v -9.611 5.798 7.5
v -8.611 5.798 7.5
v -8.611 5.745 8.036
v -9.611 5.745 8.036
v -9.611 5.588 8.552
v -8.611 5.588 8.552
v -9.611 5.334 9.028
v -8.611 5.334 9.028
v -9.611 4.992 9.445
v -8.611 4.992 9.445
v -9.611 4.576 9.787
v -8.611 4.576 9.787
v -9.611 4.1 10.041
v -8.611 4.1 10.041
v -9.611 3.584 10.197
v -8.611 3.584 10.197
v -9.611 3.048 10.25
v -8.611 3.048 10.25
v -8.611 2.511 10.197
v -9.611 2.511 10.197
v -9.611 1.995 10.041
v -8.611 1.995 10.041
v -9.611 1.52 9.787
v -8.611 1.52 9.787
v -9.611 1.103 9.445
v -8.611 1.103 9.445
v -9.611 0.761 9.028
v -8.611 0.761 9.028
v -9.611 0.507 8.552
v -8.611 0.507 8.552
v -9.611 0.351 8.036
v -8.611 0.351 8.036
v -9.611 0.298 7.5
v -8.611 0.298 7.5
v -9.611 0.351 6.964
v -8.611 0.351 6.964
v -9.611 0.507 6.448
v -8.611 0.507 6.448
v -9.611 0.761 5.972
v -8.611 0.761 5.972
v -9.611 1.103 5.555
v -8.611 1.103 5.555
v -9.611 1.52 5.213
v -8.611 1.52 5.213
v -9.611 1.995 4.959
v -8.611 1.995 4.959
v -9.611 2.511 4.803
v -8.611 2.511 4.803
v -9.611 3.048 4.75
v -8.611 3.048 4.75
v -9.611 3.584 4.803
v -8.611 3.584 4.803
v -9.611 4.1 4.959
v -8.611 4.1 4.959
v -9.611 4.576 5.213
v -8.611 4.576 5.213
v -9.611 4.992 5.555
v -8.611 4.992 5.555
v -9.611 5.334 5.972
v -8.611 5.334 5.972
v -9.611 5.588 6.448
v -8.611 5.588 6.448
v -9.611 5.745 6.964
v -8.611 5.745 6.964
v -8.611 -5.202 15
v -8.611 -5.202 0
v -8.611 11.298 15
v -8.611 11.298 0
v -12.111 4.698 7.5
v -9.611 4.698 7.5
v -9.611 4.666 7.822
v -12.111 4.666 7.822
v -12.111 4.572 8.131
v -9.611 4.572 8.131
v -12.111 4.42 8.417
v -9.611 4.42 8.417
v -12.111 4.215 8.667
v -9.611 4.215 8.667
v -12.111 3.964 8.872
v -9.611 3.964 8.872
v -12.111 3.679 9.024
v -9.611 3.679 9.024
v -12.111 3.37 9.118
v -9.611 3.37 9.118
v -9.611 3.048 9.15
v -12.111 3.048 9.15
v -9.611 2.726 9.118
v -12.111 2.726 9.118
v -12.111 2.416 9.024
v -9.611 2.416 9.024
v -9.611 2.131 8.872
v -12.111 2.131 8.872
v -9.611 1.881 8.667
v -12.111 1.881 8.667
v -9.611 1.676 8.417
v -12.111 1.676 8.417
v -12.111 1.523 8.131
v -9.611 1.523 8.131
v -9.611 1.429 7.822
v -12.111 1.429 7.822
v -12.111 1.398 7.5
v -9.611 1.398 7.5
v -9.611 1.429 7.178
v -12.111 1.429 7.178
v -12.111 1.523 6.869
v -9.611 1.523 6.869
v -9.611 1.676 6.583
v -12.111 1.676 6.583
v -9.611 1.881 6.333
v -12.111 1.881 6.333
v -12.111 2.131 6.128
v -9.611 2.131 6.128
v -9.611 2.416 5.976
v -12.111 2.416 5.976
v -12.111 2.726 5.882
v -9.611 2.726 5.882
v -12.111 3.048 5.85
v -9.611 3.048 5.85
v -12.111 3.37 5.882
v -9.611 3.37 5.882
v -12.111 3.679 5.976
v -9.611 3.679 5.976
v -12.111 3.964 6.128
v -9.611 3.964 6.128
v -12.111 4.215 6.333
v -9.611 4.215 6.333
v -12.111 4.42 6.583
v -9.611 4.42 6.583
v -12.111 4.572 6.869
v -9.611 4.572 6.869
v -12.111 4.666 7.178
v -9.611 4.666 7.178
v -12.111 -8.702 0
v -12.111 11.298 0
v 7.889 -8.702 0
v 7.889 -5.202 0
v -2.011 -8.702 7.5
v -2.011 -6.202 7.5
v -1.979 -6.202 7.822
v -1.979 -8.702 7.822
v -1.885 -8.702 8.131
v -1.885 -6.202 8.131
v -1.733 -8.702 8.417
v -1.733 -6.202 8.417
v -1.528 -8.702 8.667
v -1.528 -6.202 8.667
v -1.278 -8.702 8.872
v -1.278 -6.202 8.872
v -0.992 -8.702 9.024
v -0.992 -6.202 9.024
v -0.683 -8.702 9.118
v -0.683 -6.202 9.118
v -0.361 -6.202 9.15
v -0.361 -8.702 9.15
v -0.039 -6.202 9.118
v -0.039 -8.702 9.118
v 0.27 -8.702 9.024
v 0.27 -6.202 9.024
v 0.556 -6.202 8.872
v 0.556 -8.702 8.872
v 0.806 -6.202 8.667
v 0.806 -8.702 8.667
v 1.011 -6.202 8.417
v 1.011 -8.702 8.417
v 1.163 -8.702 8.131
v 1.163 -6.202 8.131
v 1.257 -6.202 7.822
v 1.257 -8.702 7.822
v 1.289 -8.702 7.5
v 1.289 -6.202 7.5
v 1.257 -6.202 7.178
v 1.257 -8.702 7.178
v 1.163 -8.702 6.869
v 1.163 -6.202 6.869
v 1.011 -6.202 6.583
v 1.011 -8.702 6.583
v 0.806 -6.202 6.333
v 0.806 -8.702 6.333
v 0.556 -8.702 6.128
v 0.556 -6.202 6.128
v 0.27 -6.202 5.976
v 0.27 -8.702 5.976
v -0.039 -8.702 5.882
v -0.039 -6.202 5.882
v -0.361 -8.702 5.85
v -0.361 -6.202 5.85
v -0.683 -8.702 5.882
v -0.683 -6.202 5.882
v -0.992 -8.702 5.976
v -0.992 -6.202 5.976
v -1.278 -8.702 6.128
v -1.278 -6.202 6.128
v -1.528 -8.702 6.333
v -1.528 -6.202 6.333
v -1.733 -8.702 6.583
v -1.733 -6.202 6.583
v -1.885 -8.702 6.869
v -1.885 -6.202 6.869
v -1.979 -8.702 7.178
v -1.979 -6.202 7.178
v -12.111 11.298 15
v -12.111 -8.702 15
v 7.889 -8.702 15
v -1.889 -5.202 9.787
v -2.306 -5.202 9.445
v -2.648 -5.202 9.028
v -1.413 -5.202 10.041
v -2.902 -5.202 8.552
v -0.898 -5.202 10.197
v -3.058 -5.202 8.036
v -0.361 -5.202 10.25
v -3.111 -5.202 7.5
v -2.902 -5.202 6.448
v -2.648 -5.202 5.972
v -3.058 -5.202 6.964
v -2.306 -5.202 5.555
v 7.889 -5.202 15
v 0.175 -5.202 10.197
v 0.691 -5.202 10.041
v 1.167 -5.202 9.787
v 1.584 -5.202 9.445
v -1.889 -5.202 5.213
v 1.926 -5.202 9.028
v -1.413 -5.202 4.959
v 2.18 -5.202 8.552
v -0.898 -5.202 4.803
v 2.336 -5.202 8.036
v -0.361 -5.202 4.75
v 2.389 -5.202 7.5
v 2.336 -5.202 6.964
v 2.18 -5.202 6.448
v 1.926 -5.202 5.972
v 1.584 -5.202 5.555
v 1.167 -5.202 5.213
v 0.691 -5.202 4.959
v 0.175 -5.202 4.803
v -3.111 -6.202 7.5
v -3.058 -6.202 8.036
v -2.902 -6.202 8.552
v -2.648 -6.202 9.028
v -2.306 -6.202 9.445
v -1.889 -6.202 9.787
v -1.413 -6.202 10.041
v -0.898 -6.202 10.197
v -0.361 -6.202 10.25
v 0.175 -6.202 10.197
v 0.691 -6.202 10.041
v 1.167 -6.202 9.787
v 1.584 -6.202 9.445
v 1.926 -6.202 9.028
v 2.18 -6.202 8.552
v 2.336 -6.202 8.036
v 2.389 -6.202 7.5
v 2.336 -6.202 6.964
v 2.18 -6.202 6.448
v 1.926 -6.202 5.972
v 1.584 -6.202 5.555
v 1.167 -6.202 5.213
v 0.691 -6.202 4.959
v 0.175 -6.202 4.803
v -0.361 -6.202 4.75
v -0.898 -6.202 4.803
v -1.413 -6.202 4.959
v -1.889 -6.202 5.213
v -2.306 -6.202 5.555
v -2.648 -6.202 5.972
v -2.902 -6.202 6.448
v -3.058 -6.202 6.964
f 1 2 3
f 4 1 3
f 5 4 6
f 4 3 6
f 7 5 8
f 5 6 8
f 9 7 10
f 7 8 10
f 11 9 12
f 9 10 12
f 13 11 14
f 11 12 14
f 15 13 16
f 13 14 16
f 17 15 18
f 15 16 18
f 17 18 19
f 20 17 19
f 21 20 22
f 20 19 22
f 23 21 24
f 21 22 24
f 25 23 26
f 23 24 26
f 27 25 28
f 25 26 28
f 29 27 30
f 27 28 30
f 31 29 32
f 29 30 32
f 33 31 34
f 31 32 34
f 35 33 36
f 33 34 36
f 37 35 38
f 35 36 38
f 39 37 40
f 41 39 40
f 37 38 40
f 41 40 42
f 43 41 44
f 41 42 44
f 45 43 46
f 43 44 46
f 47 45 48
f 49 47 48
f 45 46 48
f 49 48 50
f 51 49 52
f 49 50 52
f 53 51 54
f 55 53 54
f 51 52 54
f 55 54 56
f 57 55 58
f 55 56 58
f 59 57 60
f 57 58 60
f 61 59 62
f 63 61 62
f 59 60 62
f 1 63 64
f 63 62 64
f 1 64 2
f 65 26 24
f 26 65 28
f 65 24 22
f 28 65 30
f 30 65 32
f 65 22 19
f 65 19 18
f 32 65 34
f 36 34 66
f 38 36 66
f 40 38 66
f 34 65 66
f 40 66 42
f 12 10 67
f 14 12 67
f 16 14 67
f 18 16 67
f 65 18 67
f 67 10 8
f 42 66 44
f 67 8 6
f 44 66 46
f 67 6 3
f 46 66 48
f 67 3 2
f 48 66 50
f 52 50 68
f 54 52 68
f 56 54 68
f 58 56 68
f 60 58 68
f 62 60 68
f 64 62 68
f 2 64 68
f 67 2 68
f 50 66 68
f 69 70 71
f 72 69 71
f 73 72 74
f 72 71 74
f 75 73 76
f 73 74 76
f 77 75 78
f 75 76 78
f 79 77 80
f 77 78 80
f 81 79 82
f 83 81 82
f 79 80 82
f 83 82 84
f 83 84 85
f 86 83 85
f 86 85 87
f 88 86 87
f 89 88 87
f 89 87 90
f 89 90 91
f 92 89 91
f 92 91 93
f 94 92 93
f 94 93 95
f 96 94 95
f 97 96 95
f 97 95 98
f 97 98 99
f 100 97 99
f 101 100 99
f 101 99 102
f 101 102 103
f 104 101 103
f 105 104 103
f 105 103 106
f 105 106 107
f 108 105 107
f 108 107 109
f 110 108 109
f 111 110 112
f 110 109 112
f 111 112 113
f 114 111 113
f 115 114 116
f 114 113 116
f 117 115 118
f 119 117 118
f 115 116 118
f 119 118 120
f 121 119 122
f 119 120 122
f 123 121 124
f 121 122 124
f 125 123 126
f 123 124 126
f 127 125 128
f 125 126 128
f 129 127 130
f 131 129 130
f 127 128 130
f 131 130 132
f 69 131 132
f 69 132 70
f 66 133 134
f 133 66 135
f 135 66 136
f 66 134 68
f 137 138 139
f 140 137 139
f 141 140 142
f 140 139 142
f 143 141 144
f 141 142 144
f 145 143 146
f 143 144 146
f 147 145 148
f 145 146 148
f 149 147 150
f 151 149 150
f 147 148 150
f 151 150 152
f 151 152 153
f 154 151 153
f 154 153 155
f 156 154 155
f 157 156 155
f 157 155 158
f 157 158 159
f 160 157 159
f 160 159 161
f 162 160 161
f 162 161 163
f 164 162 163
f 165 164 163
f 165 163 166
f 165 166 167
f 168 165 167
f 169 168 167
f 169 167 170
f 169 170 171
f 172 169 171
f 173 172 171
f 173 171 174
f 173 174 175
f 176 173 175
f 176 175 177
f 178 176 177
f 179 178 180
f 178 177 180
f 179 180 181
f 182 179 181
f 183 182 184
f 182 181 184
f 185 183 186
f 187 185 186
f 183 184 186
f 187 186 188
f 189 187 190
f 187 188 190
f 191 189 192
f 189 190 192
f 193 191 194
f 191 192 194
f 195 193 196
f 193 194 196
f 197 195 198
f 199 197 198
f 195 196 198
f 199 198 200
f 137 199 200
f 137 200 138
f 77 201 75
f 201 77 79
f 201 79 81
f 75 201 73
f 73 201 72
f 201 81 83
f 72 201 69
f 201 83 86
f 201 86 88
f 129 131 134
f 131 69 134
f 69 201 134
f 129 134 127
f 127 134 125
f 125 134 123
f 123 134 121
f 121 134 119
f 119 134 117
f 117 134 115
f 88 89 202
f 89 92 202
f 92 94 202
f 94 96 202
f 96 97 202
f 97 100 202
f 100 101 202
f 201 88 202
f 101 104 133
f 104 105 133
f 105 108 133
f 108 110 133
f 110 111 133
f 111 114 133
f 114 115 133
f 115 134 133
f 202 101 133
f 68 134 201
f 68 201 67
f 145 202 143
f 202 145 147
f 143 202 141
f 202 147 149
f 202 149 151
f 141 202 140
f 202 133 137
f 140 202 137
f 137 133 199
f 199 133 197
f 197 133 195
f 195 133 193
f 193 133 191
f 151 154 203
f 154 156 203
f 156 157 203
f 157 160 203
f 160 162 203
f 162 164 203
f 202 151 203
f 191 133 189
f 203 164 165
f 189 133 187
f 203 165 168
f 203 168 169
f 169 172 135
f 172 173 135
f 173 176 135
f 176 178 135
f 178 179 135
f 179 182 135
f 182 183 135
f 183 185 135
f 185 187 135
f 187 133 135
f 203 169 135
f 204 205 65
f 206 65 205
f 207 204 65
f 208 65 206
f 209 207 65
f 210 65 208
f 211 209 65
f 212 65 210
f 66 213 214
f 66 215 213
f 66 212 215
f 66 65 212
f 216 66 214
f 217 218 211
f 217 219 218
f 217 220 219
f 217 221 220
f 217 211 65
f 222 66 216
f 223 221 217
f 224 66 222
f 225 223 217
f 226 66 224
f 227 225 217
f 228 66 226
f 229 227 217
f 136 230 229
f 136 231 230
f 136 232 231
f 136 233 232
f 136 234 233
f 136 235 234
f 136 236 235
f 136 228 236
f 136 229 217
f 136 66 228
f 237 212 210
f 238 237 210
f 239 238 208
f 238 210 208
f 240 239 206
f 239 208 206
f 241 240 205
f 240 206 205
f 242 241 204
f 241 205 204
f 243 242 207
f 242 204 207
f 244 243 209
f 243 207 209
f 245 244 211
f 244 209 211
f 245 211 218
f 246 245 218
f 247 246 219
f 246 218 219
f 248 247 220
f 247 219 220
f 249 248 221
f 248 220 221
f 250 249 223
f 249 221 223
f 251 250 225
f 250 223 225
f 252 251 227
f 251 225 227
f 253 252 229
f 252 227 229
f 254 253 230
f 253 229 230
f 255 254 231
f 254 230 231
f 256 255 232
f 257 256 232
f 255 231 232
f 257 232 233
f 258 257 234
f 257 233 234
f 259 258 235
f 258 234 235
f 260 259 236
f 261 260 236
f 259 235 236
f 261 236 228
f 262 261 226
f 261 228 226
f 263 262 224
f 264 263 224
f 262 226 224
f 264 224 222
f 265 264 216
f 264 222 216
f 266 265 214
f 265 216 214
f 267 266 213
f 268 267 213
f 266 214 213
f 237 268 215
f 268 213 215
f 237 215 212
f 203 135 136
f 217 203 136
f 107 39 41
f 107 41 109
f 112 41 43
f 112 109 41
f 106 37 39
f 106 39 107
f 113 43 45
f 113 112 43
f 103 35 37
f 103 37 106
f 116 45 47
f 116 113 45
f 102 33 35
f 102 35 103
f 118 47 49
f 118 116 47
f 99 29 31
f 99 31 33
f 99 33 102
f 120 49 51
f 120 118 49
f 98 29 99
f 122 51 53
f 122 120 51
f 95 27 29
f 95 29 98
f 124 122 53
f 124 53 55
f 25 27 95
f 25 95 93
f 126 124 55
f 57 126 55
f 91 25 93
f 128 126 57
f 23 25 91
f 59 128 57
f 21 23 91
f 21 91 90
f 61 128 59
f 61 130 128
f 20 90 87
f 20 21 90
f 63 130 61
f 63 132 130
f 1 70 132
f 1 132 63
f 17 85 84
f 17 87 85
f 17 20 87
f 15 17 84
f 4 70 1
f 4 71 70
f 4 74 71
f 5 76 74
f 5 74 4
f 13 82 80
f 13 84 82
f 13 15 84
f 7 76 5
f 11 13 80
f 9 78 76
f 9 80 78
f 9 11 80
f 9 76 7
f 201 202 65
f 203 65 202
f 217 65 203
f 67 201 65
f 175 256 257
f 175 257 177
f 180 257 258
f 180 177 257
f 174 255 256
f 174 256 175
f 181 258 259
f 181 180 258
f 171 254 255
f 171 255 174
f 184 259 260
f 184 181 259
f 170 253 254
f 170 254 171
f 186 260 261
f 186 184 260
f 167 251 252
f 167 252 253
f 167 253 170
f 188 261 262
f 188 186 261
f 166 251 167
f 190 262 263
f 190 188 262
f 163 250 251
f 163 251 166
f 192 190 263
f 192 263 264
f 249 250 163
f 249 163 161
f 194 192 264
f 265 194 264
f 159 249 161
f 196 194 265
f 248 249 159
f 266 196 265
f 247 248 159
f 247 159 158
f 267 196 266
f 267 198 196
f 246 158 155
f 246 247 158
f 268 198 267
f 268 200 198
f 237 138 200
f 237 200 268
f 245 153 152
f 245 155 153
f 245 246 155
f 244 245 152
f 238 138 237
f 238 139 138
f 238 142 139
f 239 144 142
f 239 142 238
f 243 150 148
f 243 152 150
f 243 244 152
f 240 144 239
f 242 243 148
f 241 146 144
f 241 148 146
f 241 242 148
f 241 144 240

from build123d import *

# Parameters (mm, degrees)
F0_W     = 3.5
F0_H     = 16.5
F0_H_2   = 3.5
F0_W_2   = 16.5
F1_DEPTH = 15
F2_R     = 1.65
F4_DEPTH = 3.5
F2_R_2   = 2.75
F5_DEPTH = 1
F3_R     = 1.65
F6_DEPTH = 3.5
F3_R_2   = 2.75
F7_DEPTH = 1


with BuildPart() as f1:
    # F0 (on Top) → F1 (new body)
    with BuildSketch(Plane.XY):
        with Locations((-10.361038, 3.047789)):
            Rectangle(F0_W, F0_H)
        with Locations((-10.361038, -6.952211)):
            Rectangle(F0_W, F0_H_2)
        with Locations((-0.361038, -6.952211)):
            Rectangle(F0_W_2, F0_H_2)
    extrude(amount=F1_DEPTH)

    # F2 (on face) → F4 (cut, through all)
    with BuildSketch(Plane.YZ.offset(-8.611038)):
        with Locations((3.047789, 7.5)):
            Circle(F2_R)
    extrude(amount=-F4_DEPTH, mode=Mode.SUBTRACT)

    # F2 (on face) → F5 (cut)
    with BuildSketch(Plane.YZ.offset(-8.611038)):
        with Locations((3.047789, 7.5)):
            Circle(F2_R_2)
        with Locations((3.047789, 7.5)):
            Circle(F2_R, mode=Mode.SUBTRACT)
    extrude(amount=-F5_DEPTH, mode=Mode.SUBTRACT)

    # F3 (on face) → F6 (cut, through all)
    with BuildSketch(Plane(origin=(0, -5.202211, 0), x_dir=(-1, 0, 0), z_dir=(0, 1, 0))):
        with Locations((0.361038, 7.5)):
            Circle(F3_R)
    extrude(amount=-F6_DEPTH, mode=Mode.SUBTRACT)

    # F3 (on face) → F7 (cut)
    with BuildSketch(Plane(origin=(0, -5.202211, 0), x_dir=(-1, 0, 0), z_dir=(0, 1, 0))):
        with Locations((0.361038, 7.5)):
            Circle(F3_R_2)
        with Locations((0.361038, 7.5)):
            Circle(F3_R, mode=Mode.SUBTRACT)
    extrude(amount=-F7_DEPTH, mode=Mode.SUBTRACT)


solid = f1.part
